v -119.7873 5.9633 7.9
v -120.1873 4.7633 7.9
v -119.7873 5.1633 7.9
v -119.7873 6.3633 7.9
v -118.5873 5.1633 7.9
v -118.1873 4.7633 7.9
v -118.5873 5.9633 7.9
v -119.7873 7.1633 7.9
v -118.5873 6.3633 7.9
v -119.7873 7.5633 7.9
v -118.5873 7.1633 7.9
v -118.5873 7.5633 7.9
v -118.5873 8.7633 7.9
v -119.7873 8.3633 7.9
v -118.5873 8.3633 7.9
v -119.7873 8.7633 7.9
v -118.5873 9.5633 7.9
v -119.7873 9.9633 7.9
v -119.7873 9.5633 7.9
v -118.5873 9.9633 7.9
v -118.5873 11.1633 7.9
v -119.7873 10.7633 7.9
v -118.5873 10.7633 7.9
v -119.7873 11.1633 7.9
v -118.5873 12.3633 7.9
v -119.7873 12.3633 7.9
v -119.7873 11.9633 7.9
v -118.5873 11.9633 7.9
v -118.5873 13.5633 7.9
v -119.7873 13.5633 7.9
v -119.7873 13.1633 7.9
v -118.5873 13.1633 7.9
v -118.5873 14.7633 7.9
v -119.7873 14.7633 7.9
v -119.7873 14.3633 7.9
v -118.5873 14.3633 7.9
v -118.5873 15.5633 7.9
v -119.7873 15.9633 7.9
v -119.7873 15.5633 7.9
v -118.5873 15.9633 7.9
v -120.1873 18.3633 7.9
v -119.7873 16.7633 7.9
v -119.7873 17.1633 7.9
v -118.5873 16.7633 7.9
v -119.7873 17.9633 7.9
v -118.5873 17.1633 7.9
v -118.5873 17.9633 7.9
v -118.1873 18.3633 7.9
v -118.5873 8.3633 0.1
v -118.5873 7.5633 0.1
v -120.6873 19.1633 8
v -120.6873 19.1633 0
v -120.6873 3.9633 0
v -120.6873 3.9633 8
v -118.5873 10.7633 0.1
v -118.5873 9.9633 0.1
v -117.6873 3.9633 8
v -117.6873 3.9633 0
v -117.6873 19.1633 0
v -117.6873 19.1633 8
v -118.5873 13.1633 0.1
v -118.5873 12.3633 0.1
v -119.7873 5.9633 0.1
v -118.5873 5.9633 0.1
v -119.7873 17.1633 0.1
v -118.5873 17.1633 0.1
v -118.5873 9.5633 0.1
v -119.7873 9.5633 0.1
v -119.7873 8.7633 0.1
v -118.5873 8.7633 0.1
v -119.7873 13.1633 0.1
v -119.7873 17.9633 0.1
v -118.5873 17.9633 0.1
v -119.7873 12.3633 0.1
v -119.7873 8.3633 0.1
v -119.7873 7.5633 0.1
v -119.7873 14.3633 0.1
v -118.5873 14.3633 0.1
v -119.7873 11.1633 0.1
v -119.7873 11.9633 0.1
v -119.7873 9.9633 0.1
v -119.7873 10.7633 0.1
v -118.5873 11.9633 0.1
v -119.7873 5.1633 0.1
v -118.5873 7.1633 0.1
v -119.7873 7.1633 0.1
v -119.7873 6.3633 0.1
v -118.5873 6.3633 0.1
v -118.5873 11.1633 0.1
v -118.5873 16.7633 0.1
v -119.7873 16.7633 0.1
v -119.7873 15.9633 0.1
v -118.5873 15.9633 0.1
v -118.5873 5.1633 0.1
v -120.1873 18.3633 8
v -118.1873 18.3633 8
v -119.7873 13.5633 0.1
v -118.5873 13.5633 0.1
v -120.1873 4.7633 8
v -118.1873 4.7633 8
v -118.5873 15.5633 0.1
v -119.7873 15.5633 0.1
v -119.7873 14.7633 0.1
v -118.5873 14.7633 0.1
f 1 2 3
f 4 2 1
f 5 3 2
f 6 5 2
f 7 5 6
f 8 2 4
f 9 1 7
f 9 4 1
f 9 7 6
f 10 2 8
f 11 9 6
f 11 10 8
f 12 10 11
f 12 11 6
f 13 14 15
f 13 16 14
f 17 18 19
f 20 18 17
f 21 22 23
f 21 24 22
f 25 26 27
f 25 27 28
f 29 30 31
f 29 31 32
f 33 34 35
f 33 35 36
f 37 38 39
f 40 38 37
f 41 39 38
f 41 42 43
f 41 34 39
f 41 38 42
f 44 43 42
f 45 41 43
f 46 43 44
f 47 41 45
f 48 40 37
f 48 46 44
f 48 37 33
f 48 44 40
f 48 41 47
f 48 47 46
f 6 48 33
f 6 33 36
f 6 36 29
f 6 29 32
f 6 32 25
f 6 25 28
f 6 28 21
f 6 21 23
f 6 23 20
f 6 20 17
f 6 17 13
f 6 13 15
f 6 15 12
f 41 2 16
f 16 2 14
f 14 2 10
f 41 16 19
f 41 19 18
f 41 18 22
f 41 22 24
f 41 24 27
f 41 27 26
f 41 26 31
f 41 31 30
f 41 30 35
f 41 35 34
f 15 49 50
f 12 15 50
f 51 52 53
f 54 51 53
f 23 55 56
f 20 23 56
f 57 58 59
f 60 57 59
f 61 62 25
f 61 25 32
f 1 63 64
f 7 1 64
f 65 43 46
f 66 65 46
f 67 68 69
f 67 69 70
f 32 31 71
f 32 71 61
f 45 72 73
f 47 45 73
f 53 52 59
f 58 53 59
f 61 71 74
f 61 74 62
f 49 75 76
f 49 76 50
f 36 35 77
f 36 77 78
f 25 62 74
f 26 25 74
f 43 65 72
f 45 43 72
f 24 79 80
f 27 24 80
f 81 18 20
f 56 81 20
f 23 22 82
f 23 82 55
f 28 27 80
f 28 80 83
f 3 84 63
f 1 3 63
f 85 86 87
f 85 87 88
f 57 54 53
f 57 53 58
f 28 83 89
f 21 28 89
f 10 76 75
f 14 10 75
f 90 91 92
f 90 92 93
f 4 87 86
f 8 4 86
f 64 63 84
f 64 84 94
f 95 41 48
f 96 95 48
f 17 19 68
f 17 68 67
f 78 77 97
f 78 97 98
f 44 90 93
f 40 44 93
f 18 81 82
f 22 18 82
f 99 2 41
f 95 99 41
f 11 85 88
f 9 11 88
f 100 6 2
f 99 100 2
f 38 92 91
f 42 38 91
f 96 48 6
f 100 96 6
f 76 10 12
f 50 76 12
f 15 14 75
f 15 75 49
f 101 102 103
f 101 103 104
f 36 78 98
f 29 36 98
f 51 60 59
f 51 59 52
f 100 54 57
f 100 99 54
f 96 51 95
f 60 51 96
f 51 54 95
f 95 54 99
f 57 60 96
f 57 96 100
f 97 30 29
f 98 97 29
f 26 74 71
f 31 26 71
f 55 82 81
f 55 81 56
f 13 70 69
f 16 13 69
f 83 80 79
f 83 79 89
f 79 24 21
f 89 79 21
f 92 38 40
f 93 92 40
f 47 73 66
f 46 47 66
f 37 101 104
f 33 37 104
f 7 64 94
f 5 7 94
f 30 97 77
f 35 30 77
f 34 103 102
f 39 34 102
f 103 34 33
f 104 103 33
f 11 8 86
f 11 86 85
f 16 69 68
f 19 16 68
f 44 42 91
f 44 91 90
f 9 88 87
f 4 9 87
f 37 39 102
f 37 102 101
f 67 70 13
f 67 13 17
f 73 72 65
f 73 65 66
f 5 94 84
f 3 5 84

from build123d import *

# Parameters (mm, degrees)
F0_W     = 0.4
F0_H     = 0.8
F0_W_2   = 1.2
F1_DEPTH = 8
F0_H_2   = 0.4
F2_DEPTH = 7.9
F3_DEPTH = 0.1


with BuildPart() as f1:
    # F0 (on Top) → F1 (new body)
    with BuildSketch(Plane.XY):
        with Locations((-119.9873028874, 4.3633364267)):
            Rectangle(F0_W, F0_H)
        Polygon((-120.6873028874, 19.1633364267), (-120.6873028874, 3.9633364267), (-120.1873028874, 3.9633364267), (-120.1873028874, 4.7633364267), (-120.1873028874, 5.1633364267), (-120.1873028874, 5.9633364267), (-120.1873028874, 6.3633364267), (-120.1873028874, 7.1633364267), (-120.1873028874, 7.5633364267), (-120.1873028874, 8.3633364267), (-120.1873028874, 8.7633364267), (-120.1873028874, 9.5633364267), (-120.1873028874, 9.9633364267), (-120.1873028874, 10.7633364267), (-120.1873028874, 11.1633364267), (-120.1873028874, 11.9633364267), (-120.1873028874, 12.3633364267), (-120.1873028874, 13.1633364267), (-120.1873028874, 13.5633364267), (-120.1873028874, 14.3633364267), (-120.1873028874, 14.7633364267), (-120.1873028874, 15.5633364267), (-120.1873028874, 15.9633364267), (-120.1873028874, 16.7633364267), (-120.1873028874, 17.1633364267), (-120.1873028874, 17.9633364267), (-120.1873028874, 18.3633364267), (-120.1873028874, 19.1633364267), align=None)
        with Locations((-119.1873028874, 4.3633364267)):
            Rectangle(F0_W_2, F0_H)
        with Locations((-118.3873028874, 4.3633364267)):
            Rectangle(F0_W, F0_H)
        with Locations((-119.9873028874, 18.7633364267)):
            Rectangle(F0_W, F0_H)
        with Locations((-119.1873028874, 18.7633364267)):
            Rectangle(F0_W_2, F0_H)
        with Locations((-118.3873028874, 18.7633364267)):
            Rectangle(F0_W, F0_H)
        Polygon((-118.1873028874, 4.7633364267), (-118.1873028874, 3.9633364267), (-117.6873028874, 3.9633364267), (-117.6873028874, 19.1633364267), (-118.1873028874, 19.1633364267), (-118.1873028874, 18.3633364267), (-118.1873028874, 17.9633364267), (-118.1873028874, 17.1633364267), (-118.1873028874, 16.7633364267), (-118.1873028874, 15.9633364267), (-118.1873028874, 15.5633364267), (-118.1873028874, 14.7633364267), (-118.1873028874, 14.3633364267), (-118.1873028874, 13.5633364267), (-118.1873028874, 13.1633364267), (-118.1873028874, 12.3633364267), (-118.1873028874, 11.9633364267), (-118.1873028874, 11.1633364267), (-118.1873028874, 10.7633364267), (-118.1873028874, 9.9633364267), (-118.1873028874, 9.5633364267), (-118.1873028874, 8.7633364267), (-118.1873028874, 8.3633364267), (-118.1873028874, 7.5633364267), (-118.1873028874, 7.1633364267), (-118.1873028874, 6.3633364267), (-118.1873028874, 5.9633364267), (-118.1873028874, 5.1633364267), align=None)
    extrude(amount=F1_DEPTH)

    # F0 (on Top) → F2 (join)
    with BuildSketch(Plane.XY):
        with Locations((-119.9873028874, 4.9633364267)):
            Rectangle(F0_W, F0_H_2)
        with Locations((-119.1873028874, 4.9633364267)):
            Rectangle(F0_W_2, F0_H_2)
        with Locations((-118.3873028874, 4.9633364267)):
            Rectangle(F0_W, F0_H_2)
        with Locations((-118.3873028874, 5.5633364267)):
            Rectangle(F0_W, F0_H)
        with Locations((-118.3873028874, 6.1633364267)):
            Rectangle(F0_W, F0_H_2)
        with Locations((-119.1873028874, 6.1633364267)):
            Rectangle(F0_W_2, F0_H_2)
        with Locations((-119.9873028874, 6.1633364267)):
            Rectangle(F0_W, F0_H_2)
        with Locations((-119.9873028874, 5.5633364267)):
            Rectangle(F0_W, F0_H)
        with Locations((-119.9873028874, 6.7633364267)):
            Rectangle(F0_W, F0_H)
        with Locations((-119.9873028874, 8.5633364267)):
            Rectangle(F0_W, F0_H_2)
        with Locations((-119.9873028874, 9.1633364267)):
            Rectangle(F0_W, F0_H)
        with Locations((-119.9873028874, 9.7633364267)):
            Rectangle(F0_W, F0_H_2)
        with Locations((-119.9873028874, 10.3633364267)):
            Rectangle(F0_W, F0_H)
        with Locations((-119.9873028874, 11.5633364267)):
            Rectangle(F0_W, F0_H)
        with Locations((-119.9873028874, 12.7633364267)):
            Rectangle(F0_W, F0_H)
        with Locations((-119.9873028874, 13.3633364267)):
            Rectangle(F0_W, F0_H_2)
        with Locations((-119.9873028874, 14.5633364267)):
            Rectangle(F0_W, F0_H_2)
        with Locations((-119.9873028874, 15.1633364267)):
            Rectangle(F0_W, F0_H)
        with Locations((-119.9873028874, 15.7633364267)):
            Rectangle(F0_W, F0_H_2)
        with Locations((-119.9873028874, 16.3633364267)):
            Rectangle(F0_W, F0_H)
        with Locations((-119.9873028874, 16.9633364267)):
            Rectangle(F0_W, F0_H_2)
        with Locations((-119.9873028874, 17.5633364267)):
            Rectangle(F0_W, F0_H)
        with Locations((-119.9873028874, 18.1633364267)):
            Rectangle(F0_W, F0_H_2)
        with Locations((-119.1873028874, 18.1633364267)):
            Rectangle(F0_W_2, F0_H_2)
        with Locations((-118.3873028874, 18.1633364267)):
            Rectangle(F0_W, F0_H_2)
        with Locations((-118.3873028874, 17.5633364267)):
            Rectangle(F0_W, F0_H)
        with Locations((-118.3873028874, 16.9633364267)):
            Rectangle(F0_W, F0_H_2)
        with Locations((-118.3873028874, 16.3633364267)):
            Rectangle(F0_W, F0_H)
        with Locations((-118.3873028874, 15.7633364267)):
            Rectangle(F0_W, F0_H_2)
        with Locations((-118.3873028874, 15.1633364267)):
            Rectangle(F0_W, F0_H)
        with Locations((-118.3873028874, 13.9633364267)):
            Rectangle(F0_W, F0_H)
        with Locations((-118.3873028874, 14.5633364267)):
            Rectangle(F0_W, F0_H_2)
        with Locations((-118.3873028874, 11.5633364267)):
            Rectangle(F0_W, F0_H)
        with Locations((-118.3873028874, 10.9633364267)):
            Rectangle(F0_W, F0_H_2)
        with Locations((-118.3873028874, 10.3633364267)):
            Rectangle(F0_W, F0_H)
        with Locations((-118.3873028874, 8.5633364267)):
            Rectangle(F0_W, F0_H_2)
        with Locations((-118.3873028874, 7.9633364267)):
            Rectangle(F0_W, F0_H)
        with Locations((-118.3873028874, 7.3633364267)):
            Rectangle(F0_W, F0_H_2)
        with Locations((-118.3873028874, 6.7633364267)):
            Rectangle(F0_W, F0_H)
        with Locations((-119.9873028874, 7.3633364267)):
            Rectangle(F0_W, F0_H_2)
        with Locations((-119.9873028874, 10.9633364267)):
            Rectangle(F0_W, F0_H_2)
        with Locations((-119.9873028874, 12.1633364267)):
            Rectangle(F0_W, F0_H_2)
        with Locations((-119.9873028874, 13.9633364267)):
            Rectangle(F0_W, F0_H)
        with Locations((-119.9873028874, 7.9633364267)):
            Rectangle(F0_W, F0_H)
        with Locations((-119.1873028874, 16.9633364267)):
            Rectangle(F0_W_2, F0_H_2)
        with Locations((-119.1873028874, 15.7633364267)):
            Rectangle(F0_W_2, F0_H_2)
        with Locations((-119.1873028874, 14.5633364267)):
            Rectangle(F0_W_2, F0_H_2)
        with Locations((-119.1873028874, 13.3633364267)):
            Rectangle(F0_W_2, F0_H_2)
        with Locations((-119.1873028874, 12.1633364267)):
            Rectangle(F0_W_2, F0_H_2)
        with Locations((-119.1873028874, 10.9633364267)):
            Rectangle(F0_W_2, F0_H_2)
        with Locations((-119.1873028874, 9.7633364267)):
            Rectangle(F0_W_2, F0_H_2)
        with Locations((-119.1873028874, 8.5633364267)):
            Rectangle(F0_W_2, F0_H_2)
        with Locations((-119.1873028874, 7.3633364267)):
            Rectangle(F0_W_2, F0_H_2)
        with Locations((-118.3873028874, 9.1633364267)):
            Rectangle(F0_W, F0_H)
        with Locations((-118.3873028874, 9.7633364267)):
            Rectangle(F0_W, F0_H_2)
        with Locations((-118.3873028874, 12.1633364267)):
            Rectangle(F0_W, F0_H_2)
        with Locations((-118.3873028874, 12.7633364267)):
            Rectangle(F0_W, F0_H)
        with Locations((-118.3873028874, 13.3633364267)):
            Rectangle(F0_W, F0_H_2)
    extrude(amount=F2_DEPTH)

    # F0 (on Top) → F3 (join)
    with BuildSketch(Plane.XY):
        with Locations((-119.1873028874, 17.5633364267)):
            Rectangle(F0_W_2, F0_H)
        with Locations((-119.1873028874, 16.3633364267)):
            Rectangle(F0_W_2, F0_H)
        with Locations((-119.1873028874, 15.1633364267)):
            Rectangle(F0_W_2, F0_H)
        with Locations((-119.1873028874, 13.9633364267)):
            Rectangle(F0_W_2, F0_H)
        with Locations((-119.1873028874, 12.7633364267)):
            Rectangle(F0_W_2, F0_H)
        with Locations((-119.1873028874, 11.5633364267)):
            Rectangle(F0_W_2, F0_H)
        with Locations((-119.1873028874, 10.3633364267)):
            Rectangle(F0_W_2, F0_H)
        with Locations((-119.1873028874, 9.1633364267)):
            Rectangle(F0_W_2, F0_H)
        with Locations((-119.1873028874, 7.9633364267)):
            Rectangle(F0_W_2, F0_H)
        with Locations((-119.1873028874, 6.7633364267)):
            Rectangle(F0_W_2, F0_H)
        with Locations((-119.1873028874, 5.5633364267)):
            Rectangle(F0_W_2, F0_H)
    extrude(amount=F3_DEPTH)


solid = f1.part
